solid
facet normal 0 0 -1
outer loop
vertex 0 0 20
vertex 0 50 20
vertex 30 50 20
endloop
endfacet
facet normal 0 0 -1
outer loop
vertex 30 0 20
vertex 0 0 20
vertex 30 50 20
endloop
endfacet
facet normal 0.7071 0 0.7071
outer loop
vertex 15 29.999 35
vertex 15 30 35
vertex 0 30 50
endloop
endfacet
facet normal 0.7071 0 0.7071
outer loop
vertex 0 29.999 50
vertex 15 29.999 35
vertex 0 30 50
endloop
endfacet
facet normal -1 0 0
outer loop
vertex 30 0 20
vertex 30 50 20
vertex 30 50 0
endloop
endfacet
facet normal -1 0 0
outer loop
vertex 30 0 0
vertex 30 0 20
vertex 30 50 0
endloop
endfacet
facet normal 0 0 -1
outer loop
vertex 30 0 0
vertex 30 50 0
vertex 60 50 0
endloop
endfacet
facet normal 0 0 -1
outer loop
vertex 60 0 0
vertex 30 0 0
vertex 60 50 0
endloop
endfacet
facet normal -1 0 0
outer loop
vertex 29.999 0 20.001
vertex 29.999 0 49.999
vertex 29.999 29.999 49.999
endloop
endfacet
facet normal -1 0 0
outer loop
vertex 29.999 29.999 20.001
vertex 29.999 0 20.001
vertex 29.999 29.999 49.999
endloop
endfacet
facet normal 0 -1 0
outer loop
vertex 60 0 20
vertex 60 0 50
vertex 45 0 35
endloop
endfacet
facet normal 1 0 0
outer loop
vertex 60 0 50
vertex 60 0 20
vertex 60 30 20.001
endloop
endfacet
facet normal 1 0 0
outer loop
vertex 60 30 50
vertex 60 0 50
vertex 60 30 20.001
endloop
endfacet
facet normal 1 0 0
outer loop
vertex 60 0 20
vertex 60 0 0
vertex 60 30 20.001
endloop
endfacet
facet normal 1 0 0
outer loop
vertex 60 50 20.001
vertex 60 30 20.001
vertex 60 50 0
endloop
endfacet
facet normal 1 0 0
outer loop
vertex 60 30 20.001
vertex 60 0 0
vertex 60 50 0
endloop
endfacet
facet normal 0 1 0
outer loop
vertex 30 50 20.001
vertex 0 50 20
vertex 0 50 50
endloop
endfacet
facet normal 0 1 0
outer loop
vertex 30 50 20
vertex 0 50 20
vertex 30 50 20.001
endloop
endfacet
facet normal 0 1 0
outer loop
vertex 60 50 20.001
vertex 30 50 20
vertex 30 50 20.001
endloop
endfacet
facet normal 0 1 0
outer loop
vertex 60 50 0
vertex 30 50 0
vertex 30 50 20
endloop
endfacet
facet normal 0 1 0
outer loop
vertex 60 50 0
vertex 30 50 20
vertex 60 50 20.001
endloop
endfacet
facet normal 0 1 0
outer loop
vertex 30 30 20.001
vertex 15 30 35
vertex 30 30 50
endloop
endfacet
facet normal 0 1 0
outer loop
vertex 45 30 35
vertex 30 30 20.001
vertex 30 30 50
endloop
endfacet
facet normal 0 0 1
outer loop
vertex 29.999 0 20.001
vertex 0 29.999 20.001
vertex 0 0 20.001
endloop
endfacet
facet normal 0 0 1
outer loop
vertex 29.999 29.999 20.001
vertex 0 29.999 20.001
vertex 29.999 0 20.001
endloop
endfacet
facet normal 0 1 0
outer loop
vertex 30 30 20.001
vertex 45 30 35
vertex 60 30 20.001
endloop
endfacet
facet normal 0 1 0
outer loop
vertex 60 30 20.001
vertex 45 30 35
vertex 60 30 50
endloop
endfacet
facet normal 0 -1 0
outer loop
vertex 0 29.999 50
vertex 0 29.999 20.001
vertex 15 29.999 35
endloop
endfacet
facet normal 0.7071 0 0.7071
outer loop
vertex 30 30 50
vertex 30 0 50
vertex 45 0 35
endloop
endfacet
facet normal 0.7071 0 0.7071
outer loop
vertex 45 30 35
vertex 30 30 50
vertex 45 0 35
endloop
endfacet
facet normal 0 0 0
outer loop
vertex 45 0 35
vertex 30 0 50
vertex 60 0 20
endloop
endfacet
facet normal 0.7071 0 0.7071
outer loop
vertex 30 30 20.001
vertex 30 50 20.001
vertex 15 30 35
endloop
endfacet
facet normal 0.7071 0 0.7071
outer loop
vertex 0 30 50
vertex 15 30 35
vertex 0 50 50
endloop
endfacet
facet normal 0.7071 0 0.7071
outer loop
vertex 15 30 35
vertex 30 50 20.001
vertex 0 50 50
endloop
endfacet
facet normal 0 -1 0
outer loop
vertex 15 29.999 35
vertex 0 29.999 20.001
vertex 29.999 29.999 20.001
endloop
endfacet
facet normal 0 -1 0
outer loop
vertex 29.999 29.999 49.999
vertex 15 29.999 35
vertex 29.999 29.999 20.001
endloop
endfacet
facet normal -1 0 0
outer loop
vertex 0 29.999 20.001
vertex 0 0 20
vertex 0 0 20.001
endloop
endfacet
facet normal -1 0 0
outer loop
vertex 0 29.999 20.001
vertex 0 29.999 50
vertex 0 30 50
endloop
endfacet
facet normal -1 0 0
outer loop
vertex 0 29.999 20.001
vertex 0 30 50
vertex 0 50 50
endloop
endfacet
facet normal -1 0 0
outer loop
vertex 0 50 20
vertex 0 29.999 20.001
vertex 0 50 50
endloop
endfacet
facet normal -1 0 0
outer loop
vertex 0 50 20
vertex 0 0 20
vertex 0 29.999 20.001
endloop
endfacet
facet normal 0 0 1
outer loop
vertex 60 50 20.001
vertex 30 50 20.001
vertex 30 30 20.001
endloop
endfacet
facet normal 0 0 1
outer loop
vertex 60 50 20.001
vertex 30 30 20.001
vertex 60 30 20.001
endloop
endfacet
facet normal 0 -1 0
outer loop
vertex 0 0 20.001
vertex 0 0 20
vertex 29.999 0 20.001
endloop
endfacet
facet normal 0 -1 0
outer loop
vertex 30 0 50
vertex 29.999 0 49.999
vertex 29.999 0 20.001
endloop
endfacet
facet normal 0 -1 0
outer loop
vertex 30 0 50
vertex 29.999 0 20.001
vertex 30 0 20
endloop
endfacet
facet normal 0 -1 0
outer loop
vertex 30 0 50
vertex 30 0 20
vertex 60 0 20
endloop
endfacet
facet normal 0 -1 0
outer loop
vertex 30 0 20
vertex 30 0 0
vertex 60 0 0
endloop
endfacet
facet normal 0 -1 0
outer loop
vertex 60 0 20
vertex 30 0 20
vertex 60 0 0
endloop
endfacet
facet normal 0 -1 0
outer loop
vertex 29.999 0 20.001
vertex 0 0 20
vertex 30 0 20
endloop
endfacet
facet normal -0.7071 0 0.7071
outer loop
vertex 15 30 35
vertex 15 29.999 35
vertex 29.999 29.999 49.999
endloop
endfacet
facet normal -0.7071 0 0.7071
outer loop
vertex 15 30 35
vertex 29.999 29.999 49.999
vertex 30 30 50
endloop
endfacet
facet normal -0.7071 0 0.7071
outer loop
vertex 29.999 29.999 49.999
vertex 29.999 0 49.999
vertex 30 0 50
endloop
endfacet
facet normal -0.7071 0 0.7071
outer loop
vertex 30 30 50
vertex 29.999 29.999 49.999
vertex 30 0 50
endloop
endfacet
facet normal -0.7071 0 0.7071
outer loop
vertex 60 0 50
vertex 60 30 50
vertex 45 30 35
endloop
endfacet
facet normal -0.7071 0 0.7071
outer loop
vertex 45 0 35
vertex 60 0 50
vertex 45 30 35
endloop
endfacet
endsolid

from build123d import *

# Parameters (mm, degrees)
SKETCH1_W            = 60
SKETCH1_H            = 50
BOSS_EXTRUDE1_DEPTH  = 50
SKETCH2_W            = 30
SKETCH2_H            = 20
CUT_EXTRUDE1_DEPTH   = 50
CUT_EXTRUDE2_DEPTH   = 50
SKETCH5_W            = 30
SKETCH5_H            = 20
CUT_EXTRUDE6_DEPTH   = 29.999
SKETCH7_W            = 29.999
SKETCH7_H            = 29.999
CUT_EXTRUDE10_DEPTH  = 29.999
CUT_EXTRUDE11_DEPTH  = 20
BOSS_EXTRUDE5_DEPTH  = 20
CUT_EXTRUDE17_DEPTH  = 0.0001
CUT_EXTRUDE18_DEPTH  = 0.0001
BOSS_EXTRUDE16_DEPTH = 0.0001


with BuildPart() as part:
    # Sketch1 → Boss-Extrude1 (new body)
    with BuildSketch(Plane.XY):
        with Locations((30, 25)):
            Rectangle(SKETCH1_W, SKETCH1_H)
    extrude(amount=BOSS_EXTRUDE1_DEPTH)

    # Sketch2 → Cut-Extrude1 (cut)
    with BuildSketch(Plane(origin=(0, 50, 0), x_dir=(1, 0, 0), z_dir=(0, 1, 0))):
        with Locations((15, -10)):
            Rectangle(SKETCH2_W, SKETCH2_H)
    extrude(amount=-CUT_EXTRUDE1_DEPTH, mode=Mode.SUBTRACT)

    # Sketch3 → Cut-Extrude2 (cut)
    with BuildSketch(Plane(origin=(0, 50, 0), x_dir=(1, 0, 0), z_dir=(0, 1, 0))):
        Polygon((15, -35), (0, -50), (30, -50), align=None)
        Polygon((45, -35), (30, -50), (60, -50), align=None)
    extrude(amount=-CUT_EXTRUDE2_DEPTH, mode=Mode.SUBTRACT)

    # Sketch5 → Cut-Extrude6 (cut)
    with BuildSketch(Plane.XY.offset(50)):
        with Locations((45, 40)):
            Rectangle(SKETCH5_W, SKETCH5_H)
    extrude(amount=-CUT_EXTRUDE6_DEPTH, mode=Mode.SUBTRACT)

    # Sketch7 → Cut-Extrude10 (cut)
    with BuildSketch(Plane.XY.offset(50)):
        with Locations((14.9995, 14.9995)):
            Rectangle(SKETCH7_W, SKETCH7_H)
    extrude(amount=-CUT_EXTRUDE10_DEPTH, mode=Mode.SUBTRACT)

    # Sketch8 → Cut-Extrude11 (cut)
    with BuildSketch(Plane(origin=(0, 50, 0), x_dir=(1, 0, 0), z_dir=(0, 1, 0))):
        Polygon((15, -35), (30, -20.001), (44.999, -35.001), (30, -50), align=None)
    extrude(amount=-CUT_EXTRUDE11_DEPTH, mode=Mode.SUBTRACT)

    # Sketch11 → Boss-Extrude5 (add)
    with BuildSketch(Plane(origin=(0, 50, 0), x_dir=(1, 0, 0), z_dir=(0, 1, 0))):
        Polygon((0, -50), (0, -20), (30, -20.001), align=None)
    extrude(amount=-BOSS_EXTRUDE5_DEPTH)

    # Sketch14 → Cut-Extrude17 (cut)
    with BuildSketch(Plane(origin=(0, 29.999, 0), x_dir=(-1, 0, 0), z_dir=(0, -1, 0))):
        Polygon((-15, -35), (0, -20.001), (0, -50), align=None)
    extrude(amount=-CUT_EXTRUDE17_DEPTH, mode=Mode.SUBTRACT)

    # Sketch15 → Cut-Extrude18 (cut)
    with BuildSketch(Plane(origin=(0, 0, 0), x_dir=(-1, 0, 0), z_dir=(0, -1, 0))):
        Polygon((-45, -35), (-60, -20), (-60, -50), align=None)
    extrude(amount=-CUT_EXTRUDE18_DEPTH, mode=Mode.SUBTRACT)

    # Sketch16 → Boss-Extrude16 (add)
    with BuildSketch(Plane(origin=(0, 30, 0), x_dir=(1, 0, 0), z_dir=(0, 1, 0))):
        Polygon((45, -35), (30, -20.001), (15.000250004, -35.000250004), (30, -50), align=None)
    extrude(amount=BOSS_EXTRUDE16_DEPTH)


solid = part.part
